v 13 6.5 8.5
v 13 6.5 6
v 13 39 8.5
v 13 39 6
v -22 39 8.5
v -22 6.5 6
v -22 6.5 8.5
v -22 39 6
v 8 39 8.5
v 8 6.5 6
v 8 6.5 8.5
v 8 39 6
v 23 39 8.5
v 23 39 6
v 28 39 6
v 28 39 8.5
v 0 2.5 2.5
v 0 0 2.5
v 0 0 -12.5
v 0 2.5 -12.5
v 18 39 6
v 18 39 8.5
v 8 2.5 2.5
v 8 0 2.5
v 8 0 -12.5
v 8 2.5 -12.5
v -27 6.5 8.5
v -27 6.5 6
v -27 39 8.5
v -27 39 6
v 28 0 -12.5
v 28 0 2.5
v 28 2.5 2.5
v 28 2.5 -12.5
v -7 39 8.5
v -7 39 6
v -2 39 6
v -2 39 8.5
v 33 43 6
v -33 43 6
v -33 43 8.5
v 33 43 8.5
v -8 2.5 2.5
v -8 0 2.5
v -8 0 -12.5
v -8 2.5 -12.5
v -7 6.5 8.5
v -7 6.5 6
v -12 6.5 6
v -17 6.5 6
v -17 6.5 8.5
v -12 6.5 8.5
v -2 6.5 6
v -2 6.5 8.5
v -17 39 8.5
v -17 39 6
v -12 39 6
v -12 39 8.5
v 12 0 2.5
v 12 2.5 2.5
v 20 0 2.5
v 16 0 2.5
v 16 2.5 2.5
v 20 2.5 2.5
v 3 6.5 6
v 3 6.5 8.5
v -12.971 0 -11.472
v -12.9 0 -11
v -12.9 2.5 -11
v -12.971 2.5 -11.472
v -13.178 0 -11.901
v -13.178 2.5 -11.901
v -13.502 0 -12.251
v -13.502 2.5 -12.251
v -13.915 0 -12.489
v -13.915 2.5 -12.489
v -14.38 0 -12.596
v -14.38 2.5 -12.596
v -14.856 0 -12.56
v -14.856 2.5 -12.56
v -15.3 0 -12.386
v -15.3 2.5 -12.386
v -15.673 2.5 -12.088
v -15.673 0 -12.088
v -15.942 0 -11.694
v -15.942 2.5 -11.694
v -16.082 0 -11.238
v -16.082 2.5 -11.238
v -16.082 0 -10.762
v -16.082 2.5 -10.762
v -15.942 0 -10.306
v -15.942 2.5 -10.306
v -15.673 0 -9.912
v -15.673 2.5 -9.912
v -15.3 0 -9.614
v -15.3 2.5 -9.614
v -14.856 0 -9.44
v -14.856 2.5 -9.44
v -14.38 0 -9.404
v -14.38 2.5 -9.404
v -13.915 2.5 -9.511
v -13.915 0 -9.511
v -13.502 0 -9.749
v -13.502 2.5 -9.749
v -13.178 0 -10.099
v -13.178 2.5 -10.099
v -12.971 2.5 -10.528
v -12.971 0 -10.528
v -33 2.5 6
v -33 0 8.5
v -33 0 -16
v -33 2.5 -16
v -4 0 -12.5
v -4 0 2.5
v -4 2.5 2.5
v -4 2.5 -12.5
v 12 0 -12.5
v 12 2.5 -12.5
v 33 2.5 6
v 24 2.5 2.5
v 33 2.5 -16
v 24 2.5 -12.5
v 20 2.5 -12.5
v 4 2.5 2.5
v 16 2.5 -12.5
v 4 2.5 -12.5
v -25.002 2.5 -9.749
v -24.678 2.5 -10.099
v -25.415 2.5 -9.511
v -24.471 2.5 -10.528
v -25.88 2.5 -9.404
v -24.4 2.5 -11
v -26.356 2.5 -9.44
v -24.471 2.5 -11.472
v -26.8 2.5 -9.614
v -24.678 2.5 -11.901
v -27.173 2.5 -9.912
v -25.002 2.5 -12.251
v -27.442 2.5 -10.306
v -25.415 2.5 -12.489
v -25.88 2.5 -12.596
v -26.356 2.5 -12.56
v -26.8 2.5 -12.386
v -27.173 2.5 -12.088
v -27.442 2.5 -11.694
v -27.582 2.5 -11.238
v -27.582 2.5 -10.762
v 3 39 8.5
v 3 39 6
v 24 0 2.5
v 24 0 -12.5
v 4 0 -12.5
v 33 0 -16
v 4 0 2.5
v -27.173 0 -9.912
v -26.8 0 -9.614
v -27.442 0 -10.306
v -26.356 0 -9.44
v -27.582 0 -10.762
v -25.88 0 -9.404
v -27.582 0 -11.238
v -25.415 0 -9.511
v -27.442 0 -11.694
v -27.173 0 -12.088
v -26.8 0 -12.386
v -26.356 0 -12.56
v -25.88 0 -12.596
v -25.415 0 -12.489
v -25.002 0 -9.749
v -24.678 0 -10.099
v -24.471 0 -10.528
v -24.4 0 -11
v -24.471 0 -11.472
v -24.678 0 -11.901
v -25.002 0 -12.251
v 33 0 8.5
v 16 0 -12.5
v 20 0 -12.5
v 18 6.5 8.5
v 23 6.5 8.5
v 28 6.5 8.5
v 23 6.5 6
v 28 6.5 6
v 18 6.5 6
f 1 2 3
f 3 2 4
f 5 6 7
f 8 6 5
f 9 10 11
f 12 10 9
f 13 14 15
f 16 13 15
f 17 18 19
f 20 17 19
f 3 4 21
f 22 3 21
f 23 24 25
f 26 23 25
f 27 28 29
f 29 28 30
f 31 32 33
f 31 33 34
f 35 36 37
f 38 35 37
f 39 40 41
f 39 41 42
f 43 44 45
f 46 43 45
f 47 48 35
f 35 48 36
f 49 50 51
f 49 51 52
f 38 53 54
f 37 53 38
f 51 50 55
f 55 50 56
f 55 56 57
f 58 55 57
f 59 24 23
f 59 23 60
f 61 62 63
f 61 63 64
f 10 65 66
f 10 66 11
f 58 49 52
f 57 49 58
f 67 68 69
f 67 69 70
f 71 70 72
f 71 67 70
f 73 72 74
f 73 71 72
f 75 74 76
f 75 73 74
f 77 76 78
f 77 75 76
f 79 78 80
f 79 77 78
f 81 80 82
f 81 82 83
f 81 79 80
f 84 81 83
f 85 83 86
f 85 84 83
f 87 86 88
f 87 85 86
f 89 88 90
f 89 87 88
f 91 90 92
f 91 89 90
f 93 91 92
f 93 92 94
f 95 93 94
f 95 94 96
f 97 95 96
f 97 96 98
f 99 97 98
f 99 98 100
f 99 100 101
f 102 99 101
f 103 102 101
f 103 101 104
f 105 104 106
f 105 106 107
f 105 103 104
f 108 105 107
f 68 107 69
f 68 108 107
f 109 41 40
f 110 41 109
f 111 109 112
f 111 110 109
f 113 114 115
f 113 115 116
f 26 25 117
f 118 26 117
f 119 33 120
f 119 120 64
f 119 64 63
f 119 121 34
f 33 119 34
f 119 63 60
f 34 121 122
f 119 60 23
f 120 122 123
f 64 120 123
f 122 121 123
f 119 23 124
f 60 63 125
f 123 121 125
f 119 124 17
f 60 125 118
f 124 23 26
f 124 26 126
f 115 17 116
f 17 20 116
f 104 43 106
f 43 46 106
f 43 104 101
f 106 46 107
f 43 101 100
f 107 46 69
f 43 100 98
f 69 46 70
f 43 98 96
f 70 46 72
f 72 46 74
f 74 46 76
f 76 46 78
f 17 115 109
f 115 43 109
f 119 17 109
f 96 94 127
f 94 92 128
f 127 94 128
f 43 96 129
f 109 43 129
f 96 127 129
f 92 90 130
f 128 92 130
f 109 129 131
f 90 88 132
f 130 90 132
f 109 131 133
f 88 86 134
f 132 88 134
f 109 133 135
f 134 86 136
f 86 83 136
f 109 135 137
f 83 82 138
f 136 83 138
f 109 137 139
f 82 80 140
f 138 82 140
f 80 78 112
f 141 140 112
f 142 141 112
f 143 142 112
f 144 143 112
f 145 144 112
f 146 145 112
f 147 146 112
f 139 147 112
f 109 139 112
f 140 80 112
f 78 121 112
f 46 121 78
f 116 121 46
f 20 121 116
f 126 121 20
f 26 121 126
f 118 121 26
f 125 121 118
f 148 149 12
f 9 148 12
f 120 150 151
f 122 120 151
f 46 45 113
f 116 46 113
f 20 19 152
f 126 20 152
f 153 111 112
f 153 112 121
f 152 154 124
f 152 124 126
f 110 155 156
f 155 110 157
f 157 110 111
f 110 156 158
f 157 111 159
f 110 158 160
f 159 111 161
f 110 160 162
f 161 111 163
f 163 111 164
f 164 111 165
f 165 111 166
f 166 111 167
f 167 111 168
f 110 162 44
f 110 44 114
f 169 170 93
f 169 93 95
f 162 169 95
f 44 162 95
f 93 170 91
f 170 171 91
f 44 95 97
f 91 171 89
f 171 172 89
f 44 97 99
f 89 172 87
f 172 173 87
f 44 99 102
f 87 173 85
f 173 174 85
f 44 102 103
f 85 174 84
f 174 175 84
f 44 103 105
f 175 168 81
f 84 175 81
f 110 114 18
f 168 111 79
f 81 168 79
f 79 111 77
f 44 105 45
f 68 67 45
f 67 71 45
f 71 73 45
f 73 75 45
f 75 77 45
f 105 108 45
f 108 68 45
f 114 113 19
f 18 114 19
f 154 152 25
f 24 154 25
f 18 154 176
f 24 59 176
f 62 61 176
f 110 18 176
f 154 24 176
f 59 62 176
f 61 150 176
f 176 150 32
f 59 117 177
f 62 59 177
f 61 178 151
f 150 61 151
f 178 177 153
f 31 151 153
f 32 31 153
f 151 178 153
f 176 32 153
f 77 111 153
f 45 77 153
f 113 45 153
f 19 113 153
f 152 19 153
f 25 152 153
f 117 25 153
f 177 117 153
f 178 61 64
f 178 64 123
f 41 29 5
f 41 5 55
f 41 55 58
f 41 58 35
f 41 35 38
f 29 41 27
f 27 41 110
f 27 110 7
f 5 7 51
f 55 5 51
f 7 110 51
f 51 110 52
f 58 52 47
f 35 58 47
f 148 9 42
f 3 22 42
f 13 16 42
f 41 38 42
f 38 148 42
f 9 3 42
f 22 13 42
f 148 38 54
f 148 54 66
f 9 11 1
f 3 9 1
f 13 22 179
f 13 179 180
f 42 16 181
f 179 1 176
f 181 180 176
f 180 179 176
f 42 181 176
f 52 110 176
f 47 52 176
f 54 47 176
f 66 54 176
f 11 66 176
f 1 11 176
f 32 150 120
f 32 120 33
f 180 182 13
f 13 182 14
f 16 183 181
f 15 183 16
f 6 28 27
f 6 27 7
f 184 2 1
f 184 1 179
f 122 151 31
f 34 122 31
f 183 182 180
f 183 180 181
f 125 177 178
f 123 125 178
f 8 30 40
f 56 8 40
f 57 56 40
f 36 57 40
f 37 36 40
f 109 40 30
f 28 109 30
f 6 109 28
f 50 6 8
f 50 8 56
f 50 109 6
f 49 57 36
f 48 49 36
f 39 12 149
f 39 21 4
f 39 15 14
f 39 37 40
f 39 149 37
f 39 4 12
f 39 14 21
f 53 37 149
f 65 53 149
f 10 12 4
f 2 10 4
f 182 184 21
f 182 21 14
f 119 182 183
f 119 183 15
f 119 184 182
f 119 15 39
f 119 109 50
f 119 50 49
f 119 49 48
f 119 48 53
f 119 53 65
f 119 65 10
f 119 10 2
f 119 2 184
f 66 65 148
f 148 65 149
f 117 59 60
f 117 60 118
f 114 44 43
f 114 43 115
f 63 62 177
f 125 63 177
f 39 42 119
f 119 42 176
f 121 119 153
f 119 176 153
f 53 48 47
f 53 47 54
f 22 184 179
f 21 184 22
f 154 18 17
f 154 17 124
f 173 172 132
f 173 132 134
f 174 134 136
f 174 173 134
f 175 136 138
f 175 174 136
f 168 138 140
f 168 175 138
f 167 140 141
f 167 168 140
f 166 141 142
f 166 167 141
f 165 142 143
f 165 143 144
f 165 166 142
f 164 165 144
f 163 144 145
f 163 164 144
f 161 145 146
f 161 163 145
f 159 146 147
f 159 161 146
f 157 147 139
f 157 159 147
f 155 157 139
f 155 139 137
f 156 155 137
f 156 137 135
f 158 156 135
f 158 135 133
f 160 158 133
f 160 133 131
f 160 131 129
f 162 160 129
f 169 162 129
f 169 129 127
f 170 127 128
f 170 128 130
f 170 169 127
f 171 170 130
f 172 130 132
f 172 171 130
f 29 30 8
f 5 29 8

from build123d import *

# Parameters (mm, degrees)
SKETCH1_R           = 1.6
BOSS_EXTRUDE1_DEPTH = 2.5
SKETCH2_W           = 66
SKETCH2_H           = 2.5
BOSS_EXTRUDE2_DEPTH = 43
SKETCH3_W           = 5
SKETCH3_H           = 32.5
CUT_EXTRUDE1_DEPTH  = 9.5
LPATTERN1_COUNT     = 6
LPATTERN1_PITCH     = 10
SKETCH4_W           = 4
SKETCH4_H           = 15
CUT_EXTRUDE2_DEPTH  = 44
LPATTERN2_COUNT     = 5
LPATTERN2_PITCH     = 8


with BuildPart() as part:
    # Sketch1 → Boss-Extrude1 (new body)
    with BuildSketch(Plane(origin=(0, 0, 0), x_dir=(1, 0, 0), z_dir=(0, 1, 0))):
        Polygon((-33, 6), (-33, 16), (33, 16), (33, 6), (33, -6), (-33, -6), align=None)
        with Locations((-26, 11)):
            Circle(SKETCH1_R, mode=Mode.SUBTRACT)
        with Locations((-14.5, 11)):
            Circle(SKETCH1_R, mode=Mode.SUBTRACT)
    extrude(amount=BOSS_EXTRUDE1_DEPTH)

    # Sketch2 → Boss-Extrude2 (add)
    with BuildSketch(Plane(origin=(0, 0, 0), x_dir=(1, 0, 0), z_dir=(0, 1, 0))):
        with Locations((0, -7.25)):
            Rectangle(SKETCH2_W, SKETCH2_H)
    extrude(amount=BOSS_EXTRUDE2_DEPTH)

    # Sketch3 → Cut-Extrude1 (cut, through all)
    with BuildSketch(Plane.XY):
        with Locations((25.5, 22.75)):
            Rectangle(SKETCH3_W, SKETCH3_H)
    cut_extrude1 = extrude(amount=CUT_EXTRUDE1_DEPTH, mode=Mode.SUBTRACT)

    # LPattern1: Cut-Extrude1 ×6
    with Locations(*[(-i * LPATTERN1_PITCH, 0, 0) for i in range(1, LPATTERN1_COUNT)]):
        add(cut_extrude1, mode=Mode.SUBTRACT)

    # Sketch4 → Cut-Extrude2 (cut, through all)
    with BuildSketch(Plane(origin=(0, 0, 0), x_dir=(1, 0, 0), z_dir=(0, 1, 0))):
        with Locations((26, 5)):
            Rectangle(SKETCH4_W, SKETCH4_H)
    cut_extrude2 = extrude(amount=CUT_EXTRUDE2_DEPTH, mode=Mode.SUBTRACT)

    # LPattern2: Cut-Extrude2 ×5
    with Locations(*[(-i * LPATTERN2_PITCH, 0, 0) for i in range(1, LPATTERN2_COUNT)]):
        add(cut_extrude2, mode=Mode.SUBTRACT)


solid = part.part
